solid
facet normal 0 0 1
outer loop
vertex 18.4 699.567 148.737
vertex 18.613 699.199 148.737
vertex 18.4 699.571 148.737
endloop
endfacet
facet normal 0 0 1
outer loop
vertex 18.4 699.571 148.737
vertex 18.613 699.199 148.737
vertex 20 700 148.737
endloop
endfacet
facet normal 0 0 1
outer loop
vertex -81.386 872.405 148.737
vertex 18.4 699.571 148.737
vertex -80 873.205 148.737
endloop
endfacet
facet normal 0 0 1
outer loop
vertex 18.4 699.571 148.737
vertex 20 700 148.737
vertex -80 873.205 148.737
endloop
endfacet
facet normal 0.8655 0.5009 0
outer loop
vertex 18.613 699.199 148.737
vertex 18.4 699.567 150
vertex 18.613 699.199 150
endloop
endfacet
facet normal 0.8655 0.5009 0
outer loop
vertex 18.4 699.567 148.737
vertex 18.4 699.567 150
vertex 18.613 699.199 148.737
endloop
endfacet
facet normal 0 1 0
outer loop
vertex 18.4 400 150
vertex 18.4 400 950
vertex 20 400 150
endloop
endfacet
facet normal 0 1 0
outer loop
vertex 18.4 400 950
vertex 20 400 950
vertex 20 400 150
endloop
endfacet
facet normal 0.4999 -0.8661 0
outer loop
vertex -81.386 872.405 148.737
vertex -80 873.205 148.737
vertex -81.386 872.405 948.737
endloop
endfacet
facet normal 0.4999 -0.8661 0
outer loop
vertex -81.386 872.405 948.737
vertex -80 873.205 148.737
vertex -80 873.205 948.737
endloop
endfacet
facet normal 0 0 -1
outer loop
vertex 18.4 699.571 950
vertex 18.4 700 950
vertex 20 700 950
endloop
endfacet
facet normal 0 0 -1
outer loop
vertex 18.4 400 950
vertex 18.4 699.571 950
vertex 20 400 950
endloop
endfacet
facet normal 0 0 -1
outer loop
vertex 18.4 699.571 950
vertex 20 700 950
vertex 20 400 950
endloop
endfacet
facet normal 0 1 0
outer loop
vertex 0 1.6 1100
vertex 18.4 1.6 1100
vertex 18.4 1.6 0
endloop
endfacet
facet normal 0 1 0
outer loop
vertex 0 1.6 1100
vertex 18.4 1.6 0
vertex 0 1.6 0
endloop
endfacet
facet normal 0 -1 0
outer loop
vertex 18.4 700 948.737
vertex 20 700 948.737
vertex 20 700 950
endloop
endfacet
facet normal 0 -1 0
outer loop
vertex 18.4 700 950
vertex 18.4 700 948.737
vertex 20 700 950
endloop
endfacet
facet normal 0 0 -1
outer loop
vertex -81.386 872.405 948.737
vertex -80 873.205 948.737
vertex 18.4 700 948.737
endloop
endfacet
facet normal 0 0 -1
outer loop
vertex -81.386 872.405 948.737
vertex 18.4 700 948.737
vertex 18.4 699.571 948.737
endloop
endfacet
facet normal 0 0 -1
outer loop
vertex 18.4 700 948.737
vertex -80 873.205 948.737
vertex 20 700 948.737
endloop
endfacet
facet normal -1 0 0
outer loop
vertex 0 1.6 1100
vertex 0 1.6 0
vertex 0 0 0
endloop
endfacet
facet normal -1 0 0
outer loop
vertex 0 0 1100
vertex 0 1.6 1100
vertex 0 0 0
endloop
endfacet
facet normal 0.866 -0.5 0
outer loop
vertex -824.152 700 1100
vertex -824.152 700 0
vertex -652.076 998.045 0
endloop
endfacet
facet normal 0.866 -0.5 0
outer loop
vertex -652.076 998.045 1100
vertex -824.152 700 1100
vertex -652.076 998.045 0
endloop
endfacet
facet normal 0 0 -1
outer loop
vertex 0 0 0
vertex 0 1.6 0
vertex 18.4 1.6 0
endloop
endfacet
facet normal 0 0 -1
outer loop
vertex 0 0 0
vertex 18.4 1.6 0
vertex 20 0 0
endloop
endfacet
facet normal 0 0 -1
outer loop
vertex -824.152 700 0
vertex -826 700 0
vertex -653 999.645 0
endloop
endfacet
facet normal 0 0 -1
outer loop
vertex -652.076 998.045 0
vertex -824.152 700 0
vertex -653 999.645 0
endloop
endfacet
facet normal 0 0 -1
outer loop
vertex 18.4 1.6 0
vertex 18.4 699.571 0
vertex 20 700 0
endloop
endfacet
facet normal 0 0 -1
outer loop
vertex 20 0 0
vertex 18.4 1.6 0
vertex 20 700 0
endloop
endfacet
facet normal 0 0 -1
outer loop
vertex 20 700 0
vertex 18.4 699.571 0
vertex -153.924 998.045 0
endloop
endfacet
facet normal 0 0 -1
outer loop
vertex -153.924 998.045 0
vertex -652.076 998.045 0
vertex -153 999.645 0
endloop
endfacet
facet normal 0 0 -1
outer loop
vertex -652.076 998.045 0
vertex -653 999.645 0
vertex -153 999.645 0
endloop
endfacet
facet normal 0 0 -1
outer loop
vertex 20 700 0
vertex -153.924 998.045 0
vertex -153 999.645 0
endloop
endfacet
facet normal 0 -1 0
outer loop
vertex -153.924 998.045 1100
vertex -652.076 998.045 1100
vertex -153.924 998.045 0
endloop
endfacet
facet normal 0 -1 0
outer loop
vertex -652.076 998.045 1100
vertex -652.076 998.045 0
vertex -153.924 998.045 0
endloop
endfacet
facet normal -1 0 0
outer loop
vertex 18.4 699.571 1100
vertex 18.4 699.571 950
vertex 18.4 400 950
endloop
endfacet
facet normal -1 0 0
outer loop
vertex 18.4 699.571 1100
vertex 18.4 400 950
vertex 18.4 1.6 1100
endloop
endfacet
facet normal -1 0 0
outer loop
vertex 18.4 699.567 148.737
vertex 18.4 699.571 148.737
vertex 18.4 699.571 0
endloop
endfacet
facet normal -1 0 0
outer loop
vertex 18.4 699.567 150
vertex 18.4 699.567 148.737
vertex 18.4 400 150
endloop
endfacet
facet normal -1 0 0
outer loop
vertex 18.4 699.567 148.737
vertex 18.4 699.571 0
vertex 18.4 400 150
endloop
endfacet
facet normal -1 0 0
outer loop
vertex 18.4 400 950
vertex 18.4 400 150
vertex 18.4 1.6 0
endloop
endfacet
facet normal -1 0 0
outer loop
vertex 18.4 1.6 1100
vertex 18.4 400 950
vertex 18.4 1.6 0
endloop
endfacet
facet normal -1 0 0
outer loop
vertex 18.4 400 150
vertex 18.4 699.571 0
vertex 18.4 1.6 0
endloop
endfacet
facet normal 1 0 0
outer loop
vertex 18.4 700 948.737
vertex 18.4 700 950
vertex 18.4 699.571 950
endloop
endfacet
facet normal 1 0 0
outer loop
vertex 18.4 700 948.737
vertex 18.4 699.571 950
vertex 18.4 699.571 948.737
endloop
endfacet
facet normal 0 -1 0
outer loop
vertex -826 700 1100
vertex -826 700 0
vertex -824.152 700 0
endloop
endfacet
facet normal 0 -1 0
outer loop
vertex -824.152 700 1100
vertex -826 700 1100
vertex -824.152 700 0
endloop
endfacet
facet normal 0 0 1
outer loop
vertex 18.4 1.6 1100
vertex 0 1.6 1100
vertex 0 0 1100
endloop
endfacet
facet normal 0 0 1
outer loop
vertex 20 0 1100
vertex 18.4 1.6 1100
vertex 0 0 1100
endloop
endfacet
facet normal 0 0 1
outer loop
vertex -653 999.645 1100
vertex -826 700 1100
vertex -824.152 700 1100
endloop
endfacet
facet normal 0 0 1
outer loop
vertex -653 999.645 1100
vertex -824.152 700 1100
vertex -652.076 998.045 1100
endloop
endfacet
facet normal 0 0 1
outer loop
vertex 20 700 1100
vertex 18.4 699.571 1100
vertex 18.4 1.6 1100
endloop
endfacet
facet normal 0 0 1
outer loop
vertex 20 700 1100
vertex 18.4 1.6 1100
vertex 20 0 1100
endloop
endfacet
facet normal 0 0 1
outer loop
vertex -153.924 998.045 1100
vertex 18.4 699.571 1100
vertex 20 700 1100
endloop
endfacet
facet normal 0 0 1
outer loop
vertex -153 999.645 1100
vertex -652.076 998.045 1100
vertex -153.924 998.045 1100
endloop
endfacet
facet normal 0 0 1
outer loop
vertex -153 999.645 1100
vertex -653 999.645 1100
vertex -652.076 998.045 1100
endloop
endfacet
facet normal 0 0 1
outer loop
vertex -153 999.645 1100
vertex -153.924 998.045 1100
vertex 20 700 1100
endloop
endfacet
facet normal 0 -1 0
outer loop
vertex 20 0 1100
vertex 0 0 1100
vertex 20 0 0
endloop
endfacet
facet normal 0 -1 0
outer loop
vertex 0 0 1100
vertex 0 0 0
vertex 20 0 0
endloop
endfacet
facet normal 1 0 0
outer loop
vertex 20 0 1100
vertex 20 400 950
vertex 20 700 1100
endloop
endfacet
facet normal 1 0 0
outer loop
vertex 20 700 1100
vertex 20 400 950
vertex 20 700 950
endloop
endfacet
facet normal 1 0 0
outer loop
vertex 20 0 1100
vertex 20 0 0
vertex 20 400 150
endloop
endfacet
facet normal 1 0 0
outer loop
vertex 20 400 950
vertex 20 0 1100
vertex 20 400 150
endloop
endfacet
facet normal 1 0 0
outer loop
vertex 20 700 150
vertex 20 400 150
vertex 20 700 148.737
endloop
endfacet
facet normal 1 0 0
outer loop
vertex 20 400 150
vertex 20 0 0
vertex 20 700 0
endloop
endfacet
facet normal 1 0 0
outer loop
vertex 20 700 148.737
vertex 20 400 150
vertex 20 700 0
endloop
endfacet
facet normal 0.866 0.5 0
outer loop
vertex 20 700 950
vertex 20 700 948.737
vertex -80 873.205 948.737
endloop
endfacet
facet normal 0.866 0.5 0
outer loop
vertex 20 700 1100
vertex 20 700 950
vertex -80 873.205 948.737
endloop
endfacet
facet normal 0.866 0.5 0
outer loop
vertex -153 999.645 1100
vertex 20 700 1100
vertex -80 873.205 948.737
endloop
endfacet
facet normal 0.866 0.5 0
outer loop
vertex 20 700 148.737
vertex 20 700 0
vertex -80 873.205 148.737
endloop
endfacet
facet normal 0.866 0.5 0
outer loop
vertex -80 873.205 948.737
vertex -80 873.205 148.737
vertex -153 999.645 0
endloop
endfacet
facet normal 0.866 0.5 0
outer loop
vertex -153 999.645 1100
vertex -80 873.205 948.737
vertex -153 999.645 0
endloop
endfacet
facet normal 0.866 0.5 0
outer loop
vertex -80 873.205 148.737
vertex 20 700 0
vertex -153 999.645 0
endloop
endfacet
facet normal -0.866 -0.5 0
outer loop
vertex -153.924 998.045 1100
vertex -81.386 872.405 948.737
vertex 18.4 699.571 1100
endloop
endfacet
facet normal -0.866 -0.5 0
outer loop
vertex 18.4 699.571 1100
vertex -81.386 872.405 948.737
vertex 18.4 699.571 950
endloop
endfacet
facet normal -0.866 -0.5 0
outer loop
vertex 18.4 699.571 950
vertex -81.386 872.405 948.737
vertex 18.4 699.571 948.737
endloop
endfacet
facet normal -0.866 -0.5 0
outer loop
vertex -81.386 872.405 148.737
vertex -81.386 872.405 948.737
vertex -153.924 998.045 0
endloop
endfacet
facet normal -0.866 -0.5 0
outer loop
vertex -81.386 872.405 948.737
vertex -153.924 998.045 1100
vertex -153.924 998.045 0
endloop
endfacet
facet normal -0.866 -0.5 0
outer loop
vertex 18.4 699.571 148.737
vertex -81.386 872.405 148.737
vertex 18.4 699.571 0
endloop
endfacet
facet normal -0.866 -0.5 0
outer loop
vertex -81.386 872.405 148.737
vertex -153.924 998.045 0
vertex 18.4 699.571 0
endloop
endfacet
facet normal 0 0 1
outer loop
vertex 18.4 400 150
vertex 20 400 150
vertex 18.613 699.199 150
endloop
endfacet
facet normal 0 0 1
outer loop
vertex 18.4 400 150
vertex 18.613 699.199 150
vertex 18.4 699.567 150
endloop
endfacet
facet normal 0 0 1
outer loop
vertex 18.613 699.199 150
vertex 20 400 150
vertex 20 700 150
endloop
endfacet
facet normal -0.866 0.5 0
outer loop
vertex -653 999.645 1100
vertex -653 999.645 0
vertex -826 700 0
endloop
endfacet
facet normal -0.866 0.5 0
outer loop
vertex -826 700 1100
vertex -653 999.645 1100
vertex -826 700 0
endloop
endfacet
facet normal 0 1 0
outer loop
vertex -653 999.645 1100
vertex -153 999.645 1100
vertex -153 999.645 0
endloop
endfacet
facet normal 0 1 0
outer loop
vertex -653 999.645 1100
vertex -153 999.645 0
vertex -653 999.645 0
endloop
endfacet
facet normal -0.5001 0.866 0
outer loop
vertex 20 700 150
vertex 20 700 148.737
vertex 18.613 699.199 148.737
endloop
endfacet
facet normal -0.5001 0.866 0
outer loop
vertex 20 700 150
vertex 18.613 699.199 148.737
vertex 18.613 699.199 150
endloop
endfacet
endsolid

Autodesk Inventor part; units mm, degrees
ref_plane "YZ Plane" through (0, 0, 0) normal (1, 0, 0) x (0, 1, 0)
ref_plane "XZ Plane" through (0, 0, 0) normal (0, 1, 0) x (-1, 0, 0)
ref_plane "XY Plane" through (0, 0, 0) normal (0, 0, 1) x (1, 0, 0)
sketch "Sketch1" plane through (0, 0, 0) normal (0, 0, 1) x (1, 0, 0)
  line L0 (0, 0) -> (20, 0)
  line L1 (20, 0) -> (20, 700)
  line L2 (20, 700) -> (-153, 999.6448)
  line L3 (-153, 999.6448) -> (-653, 999.6448)
  line L4 (-653, 999.6448) -> (-826, 700)
  line L5 (-824.1525, 700) -> (-652.0762, 998.0448)
  line L6 (-652.0762, 998.0448) -> (-153.9238, 998.0448)
  line L7 (-153.9238, 998.0448) -> (18.4, 699.5713)
  line L8 (18.4, 699.5713) -> (18.4, 1.6)
  line L9 (18.4, 1.6) -> (0, 1.6)
  line L10 (-826, 700) -> (-824.1525, 700)
  line L11 (0, 1.6) -> (0, 0)
  dimension "d0" = 20
  dimension "d1" = 700
  dimension "d2" = 90
  dimension "d3" = 346
  dimension "d4" = 150
  dimension "d5" = 500
  dimension "d6" = 346
  dimension "d7" = 120
  dimension "d8" = 1.6
extrude "main" add sketch "Sketch1" along normal blind 1100
sketch "Sketch2" plane through (20, 0, 0) normal (1, 0, 0) x (0, 0, -1)
  point P0 (0, 0)
sketch "Sketch3" plane through (20, 0, 0) normal (1, 0, 0) x (0, 0, -1)
  line L0 (-1100, 0) -> (-1100, 700) projected
  line L1 (-950, 400) -> (-150, 400)
  line L2 (-150, 400) -> (-150, 700)
  line L3 (-150, 700) -> (-950, 700)
  line L4 (-950, 700) -> (-950, 400)
  line L5 (-950, 700) -> (-150, 700)
  point P0 (0, 0)
  dimension "d13" = 800
  dimension "d14" = 300
sketch "Sketch4" plane through (-153, 999.6448, 1100) normal (0.866, 0.5, 0) x (0, 0, -1)
  line L0 (1100, -346) -> (0, -346) projected
  line L1 (151.2631, -346) -> (951.2631, -346)
  line L2 (951.2631, -346) -> (951.2631, -146)
  line L3 (951.2631, -146) -> (151.2631, -146)
  line L4 (151.2631, -146) -> (151.2631, -346)
  point P0 (1100, -942.2178)
  dimension "d16" = 800
  dimension "d17" = 200
extrude "Extrusion2" cut sketch "Sketch4" against normal blind 1.6
extrude "Extrusion3" cut sketch "Sketch3" against normal blind 1.6
properties part number "Cover 1"
